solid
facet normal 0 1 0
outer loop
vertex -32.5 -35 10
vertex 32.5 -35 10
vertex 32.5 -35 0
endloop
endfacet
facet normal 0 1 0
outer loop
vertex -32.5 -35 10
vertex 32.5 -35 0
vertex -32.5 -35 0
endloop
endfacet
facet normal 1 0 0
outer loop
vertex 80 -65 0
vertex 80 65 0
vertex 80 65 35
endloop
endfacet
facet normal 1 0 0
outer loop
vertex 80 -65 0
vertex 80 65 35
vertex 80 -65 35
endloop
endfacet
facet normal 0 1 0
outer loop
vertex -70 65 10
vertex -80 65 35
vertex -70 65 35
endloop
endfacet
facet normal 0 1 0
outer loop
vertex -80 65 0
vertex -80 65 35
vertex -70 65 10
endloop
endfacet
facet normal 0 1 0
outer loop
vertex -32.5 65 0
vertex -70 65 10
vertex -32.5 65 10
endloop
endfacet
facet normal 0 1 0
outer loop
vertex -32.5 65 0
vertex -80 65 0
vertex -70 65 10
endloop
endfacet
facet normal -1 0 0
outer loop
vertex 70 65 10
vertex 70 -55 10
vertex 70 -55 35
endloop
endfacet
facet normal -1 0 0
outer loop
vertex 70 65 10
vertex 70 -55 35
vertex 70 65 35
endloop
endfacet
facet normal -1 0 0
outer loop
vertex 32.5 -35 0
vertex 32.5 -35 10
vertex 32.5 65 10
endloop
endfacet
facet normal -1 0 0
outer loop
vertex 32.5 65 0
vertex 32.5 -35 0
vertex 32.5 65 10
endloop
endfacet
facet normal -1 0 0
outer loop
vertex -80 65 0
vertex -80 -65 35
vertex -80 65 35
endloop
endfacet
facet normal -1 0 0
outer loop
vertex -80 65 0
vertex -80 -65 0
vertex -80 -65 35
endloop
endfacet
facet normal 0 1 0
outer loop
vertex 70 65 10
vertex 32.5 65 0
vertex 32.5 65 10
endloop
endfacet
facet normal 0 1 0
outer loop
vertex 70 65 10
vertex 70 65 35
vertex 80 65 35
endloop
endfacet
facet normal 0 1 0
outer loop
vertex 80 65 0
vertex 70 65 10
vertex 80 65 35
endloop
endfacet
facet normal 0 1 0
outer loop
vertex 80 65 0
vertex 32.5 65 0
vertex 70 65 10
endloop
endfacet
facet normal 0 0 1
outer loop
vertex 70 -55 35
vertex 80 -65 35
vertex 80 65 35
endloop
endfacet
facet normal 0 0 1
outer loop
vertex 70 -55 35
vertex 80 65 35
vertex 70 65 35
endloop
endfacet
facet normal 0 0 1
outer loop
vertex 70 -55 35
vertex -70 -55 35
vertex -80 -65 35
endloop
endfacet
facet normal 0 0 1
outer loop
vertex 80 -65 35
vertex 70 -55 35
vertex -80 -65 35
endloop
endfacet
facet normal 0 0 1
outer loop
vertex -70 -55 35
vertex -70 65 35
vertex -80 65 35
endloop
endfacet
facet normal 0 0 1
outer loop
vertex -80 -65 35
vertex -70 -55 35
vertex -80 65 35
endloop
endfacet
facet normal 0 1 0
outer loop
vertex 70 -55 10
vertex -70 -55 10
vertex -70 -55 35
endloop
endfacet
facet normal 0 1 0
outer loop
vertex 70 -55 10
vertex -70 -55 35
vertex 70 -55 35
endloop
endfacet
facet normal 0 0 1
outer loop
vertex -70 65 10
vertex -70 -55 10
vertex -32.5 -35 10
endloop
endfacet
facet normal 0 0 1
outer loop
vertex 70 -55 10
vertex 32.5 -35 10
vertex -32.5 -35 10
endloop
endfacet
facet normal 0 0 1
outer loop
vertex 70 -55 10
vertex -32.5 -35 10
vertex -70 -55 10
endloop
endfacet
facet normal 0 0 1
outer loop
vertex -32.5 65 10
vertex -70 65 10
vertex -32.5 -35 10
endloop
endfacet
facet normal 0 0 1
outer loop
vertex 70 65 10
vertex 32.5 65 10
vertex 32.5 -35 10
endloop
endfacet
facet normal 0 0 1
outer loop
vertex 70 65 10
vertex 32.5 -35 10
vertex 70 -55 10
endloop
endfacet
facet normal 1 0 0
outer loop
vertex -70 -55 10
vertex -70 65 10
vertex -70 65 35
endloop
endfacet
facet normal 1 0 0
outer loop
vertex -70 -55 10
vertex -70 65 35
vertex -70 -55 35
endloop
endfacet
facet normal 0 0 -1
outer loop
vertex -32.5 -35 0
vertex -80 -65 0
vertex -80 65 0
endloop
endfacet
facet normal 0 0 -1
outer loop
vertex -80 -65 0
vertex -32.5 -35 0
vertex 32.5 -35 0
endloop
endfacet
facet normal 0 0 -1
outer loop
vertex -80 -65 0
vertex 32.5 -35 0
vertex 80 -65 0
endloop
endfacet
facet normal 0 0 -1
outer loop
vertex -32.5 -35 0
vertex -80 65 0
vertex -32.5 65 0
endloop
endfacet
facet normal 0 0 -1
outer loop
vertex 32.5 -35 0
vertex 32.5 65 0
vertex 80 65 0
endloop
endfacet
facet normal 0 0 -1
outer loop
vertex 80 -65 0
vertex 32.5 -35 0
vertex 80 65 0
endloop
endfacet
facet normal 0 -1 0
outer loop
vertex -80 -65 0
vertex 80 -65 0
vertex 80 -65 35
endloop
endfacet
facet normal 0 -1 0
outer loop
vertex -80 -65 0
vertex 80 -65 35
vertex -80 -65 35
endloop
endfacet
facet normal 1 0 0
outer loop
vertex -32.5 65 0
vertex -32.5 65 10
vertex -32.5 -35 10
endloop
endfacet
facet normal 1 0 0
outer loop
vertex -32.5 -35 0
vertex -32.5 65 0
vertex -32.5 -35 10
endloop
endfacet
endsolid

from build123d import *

# Parameters (mm, degrees)
SKETCH_1_W          = 160
SKETCH_1_H          = 130
EXTRUDE_1_DEPTH     = 10
CUT_EXTRUDE_1_DEPTH = 10
EXTRUDE_2_DEPTH     = 25


with BuildPart() as part:
    # 草图1 → 凸台-拉伸1 (new body)
    with BuildSketch(Plane.XY):
        Rectangle(SKETCH_1_W, SKETCH_1_H)
    extrude(amount=EXTRUDE_1_DEPTH)

    # 草图2 → 切除-拉伸1 (cut)
    with BuildSketch(Plane.XY.offset(10)):
        Polygon((-32.5, 35), (-32.5, 65), (32.5, 65), (32.5, 35), (32.5, -35), (-32.5, -35), align=None)
    extrude(amount=-CUT_EXTRUDE_1_DEPTH, mode=Mode.SUBTRACT)

    # 草图3 → 凸台-拉伸2 (add)
    with BuildSketch(Plane.XY.offset(10)):
        Polygon((-70, 65), (-70, -55), (70, -55), (70, 65), (80, 65), (80, -65), (-80, -65), (-80, 65), align=None)
    extrude(amount=EXTRUDE_2_DEPTH)


solid = part.part
